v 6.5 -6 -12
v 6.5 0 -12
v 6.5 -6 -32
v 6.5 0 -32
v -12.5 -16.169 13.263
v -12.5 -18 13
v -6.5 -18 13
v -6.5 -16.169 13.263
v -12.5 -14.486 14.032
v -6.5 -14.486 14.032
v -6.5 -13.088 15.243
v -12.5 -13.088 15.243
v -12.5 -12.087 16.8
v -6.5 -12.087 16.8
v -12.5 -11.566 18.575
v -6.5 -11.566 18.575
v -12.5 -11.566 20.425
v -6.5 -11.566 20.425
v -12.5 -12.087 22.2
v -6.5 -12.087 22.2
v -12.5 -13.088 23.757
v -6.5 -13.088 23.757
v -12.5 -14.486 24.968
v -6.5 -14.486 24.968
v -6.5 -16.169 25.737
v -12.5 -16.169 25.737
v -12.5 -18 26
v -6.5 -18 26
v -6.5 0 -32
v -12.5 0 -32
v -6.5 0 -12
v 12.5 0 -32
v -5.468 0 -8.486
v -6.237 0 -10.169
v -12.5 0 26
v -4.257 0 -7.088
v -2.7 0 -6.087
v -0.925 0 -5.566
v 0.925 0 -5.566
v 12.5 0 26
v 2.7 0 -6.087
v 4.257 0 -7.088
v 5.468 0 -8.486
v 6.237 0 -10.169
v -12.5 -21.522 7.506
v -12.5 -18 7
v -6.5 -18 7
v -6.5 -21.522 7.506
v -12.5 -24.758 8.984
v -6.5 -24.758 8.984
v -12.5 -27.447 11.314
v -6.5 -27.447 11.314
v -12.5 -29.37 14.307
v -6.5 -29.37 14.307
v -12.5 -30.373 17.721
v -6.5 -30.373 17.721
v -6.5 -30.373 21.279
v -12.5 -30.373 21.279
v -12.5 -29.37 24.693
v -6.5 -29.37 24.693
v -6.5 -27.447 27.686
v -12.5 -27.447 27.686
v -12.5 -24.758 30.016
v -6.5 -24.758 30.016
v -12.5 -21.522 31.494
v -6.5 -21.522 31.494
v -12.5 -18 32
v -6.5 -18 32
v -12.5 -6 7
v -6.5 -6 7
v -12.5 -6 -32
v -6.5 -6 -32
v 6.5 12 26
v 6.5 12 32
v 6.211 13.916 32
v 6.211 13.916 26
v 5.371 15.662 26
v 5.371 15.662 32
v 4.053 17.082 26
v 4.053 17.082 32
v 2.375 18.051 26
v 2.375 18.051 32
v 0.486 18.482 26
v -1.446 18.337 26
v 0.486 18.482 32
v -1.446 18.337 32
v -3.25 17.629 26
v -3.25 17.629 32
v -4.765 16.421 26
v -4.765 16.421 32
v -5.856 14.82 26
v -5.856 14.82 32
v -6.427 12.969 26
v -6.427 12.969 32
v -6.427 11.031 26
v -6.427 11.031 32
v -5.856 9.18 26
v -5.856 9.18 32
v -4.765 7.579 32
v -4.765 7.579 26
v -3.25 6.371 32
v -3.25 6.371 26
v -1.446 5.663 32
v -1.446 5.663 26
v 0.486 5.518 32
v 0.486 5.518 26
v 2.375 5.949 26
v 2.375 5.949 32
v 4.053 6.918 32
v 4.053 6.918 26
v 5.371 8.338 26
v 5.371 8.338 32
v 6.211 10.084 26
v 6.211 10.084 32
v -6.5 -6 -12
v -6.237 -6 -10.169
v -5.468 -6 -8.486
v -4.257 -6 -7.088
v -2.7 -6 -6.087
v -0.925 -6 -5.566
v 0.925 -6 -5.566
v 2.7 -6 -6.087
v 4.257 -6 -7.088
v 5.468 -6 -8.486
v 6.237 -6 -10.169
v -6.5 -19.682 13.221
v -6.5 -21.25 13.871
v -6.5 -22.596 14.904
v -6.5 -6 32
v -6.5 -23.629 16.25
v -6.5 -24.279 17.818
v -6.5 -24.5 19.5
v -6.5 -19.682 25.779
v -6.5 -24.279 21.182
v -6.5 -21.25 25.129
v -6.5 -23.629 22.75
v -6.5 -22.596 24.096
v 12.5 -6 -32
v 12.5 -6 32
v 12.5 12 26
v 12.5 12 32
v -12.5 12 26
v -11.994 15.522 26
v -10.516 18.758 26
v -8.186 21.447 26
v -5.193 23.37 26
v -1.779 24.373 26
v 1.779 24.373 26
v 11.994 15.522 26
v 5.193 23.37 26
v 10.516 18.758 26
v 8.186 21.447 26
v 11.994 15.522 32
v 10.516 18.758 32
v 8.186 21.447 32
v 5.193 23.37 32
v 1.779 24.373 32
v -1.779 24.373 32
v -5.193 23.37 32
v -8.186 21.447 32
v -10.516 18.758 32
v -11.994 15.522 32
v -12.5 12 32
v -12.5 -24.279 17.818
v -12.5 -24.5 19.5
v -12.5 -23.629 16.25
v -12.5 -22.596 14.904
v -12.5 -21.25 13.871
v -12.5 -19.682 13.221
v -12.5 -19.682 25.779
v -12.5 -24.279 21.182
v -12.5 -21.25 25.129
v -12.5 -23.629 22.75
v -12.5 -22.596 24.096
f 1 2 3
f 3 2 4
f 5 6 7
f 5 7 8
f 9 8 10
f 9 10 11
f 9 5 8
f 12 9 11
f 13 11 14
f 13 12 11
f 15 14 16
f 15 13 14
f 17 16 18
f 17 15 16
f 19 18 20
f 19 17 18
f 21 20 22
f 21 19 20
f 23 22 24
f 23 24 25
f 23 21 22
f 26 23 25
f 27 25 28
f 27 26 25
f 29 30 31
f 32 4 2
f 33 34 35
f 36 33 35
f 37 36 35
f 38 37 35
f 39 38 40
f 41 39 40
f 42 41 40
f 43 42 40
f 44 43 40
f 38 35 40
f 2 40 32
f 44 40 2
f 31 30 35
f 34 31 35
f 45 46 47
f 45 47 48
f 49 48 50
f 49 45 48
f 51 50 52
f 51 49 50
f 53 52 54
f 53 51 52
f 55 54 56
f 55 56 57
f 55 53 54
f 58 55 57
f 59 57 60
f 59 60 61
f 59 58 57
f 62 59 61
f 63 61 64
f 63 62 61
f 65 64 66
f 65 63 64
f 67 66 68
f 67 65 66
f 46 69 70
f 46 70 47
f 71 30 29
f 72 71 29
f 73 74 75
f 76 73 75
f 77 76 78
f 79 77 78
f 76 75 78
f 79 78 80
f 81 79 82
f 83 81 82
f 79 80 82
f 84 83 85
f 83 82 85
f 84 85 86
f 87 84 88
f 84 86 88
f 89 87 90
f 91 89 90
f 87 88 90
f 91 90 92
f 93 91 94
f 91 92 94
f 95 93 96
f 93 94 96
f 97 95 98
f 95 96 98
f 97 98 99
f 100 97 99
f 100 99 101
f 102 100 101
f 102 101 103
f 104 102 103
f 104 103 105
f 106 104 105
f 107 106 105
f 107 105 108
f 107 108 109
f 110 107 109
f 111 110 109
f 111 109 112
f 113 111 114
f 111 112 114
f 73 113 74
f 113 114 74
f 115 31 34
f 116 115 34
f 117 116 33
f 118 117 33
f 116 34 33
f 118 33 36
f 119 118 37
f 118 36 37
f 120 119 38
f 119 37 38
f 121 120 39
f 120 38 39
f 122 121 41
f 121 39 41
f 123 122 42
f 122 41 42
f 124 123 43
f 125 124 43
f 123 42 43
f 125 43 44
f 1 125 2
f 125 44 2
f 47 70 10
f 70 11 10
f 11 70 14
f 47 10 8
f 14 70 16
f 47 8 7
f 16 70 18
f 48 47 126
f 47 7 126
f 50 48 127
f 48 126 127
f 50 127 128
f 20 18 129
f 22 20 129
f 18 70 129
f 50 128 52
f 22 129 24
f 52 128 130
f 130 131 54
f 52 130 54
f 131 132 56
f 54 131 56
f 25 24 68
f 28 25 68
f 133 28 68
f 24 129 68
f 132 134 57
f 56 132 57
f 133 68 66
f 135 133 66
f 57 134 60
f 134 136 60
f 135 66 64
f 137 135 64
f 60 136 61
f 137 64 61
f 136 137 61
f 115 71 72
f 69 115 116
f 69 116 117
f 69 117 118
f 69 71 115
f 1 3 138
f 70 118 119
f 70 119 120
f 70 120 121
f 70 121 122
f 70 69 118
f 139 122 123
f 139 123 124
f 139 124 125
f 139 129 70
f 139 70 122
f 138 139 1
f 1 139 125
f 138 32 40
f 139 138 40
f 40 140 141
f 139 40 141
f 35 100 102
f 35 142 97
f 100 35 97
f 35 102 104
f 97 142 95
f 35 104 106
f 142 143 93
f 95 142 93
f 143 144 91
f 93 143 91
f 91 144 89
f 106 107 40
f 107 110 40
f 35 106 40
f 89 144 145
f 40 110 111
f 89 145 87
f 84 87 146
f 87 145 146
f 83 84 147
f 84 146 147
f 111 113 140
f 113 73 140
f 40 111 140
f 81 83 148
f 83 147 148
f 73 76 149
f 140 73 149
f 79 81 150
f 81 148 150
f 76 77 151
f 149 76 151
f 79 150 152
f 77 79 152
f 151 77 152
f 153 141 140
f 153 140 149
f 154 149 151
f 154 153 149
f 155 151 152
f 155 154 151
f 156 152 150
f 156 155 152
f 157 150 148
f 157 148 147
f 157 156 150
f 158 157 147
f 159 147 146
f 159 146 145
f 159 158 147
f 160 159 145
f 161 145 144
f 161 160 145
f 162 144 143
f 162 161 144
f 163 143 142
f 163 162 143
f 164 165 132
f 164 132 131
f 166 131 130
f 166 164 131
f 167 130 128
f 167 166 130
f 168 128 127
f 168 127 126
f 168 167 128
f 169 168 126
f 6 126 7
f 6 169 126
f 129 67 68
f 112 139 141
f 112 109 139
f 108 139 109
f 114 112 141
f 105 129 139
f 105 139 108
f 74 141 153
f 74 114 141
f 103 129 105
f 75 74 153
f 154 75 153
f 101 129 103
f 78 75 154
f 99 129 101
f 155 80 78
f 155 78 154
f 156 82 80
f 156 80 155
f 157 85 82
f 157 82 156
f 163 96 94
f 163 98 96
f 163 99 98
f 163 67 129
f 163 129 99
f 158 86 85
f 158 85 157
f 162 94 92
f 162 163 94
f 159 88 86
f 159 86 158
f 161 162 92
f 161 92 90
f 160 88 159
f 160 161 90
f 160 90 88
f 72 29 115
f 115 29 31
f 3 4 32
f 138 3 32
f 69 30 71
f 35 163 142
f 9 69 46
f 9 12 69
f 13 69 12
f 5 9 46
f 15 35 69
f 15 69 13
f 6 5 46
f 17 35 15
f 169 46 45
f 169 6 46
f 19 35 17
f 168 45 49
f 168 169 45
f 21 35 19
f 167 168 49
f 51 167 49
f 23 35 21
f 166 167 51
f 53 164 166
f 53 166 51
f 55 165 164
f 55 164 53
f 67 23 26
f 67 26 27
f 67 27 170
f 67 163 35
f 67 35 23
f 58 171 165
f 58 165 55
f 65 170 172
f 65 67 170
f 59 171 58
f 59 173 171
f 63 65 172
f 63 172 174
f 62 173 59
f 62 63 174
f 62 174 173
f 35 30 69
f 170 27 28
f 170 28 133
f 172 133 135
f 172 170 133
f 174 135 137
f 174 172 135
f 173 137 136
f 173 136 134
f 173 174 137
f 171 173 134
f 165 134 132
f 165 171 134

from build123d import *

# Parameters (mm, degrees)
F1_DEPTH = 6
F2_R     = 6.5
F3_DEPTH = 6
F5_DEPTH = 6


with BuildPart() as f1:
    # F0 (on Front) → F1 (new body)
    with BuildSketch(Plane.XZ):
        with BuildLine():
            Line((12.5, -32), (12.5, 32))
            Line((12.5, 32), (-12.5, 32))
            Line((-12.5, 32), (-12.5, -32))
            Line((-12.5, -32), (-6.5, -32))
            Line((-6.5, -32), (-6.5, -12))
            ThreePointArc((-6.5, -12), (0, -5.5), (6.5, -12))
            Line((6.5, -12), (6.5, -32))
            Line((6.5, -32), (12.5, -32))
        make_face()
    extrude(amount=F1_DEPTH)

    # F2 (on face) → F3 (join)
    with BuildSketch(Plane.XY.offset(32)):
        with BuildLine():
            Line((-12.5, -6), (12.5, -6))
            Line((12.5, -6), (12.5, 12))
            ThreePointArc((12.5, 12), (0, -0.5), (-12.5, 12))
            Line((-12.5, 12), (-12.5, -6))
        make_face()
        with BuildLine():
            ThreePointArc((-12.5, 12), (0, -0.5), (12.5, 12))
            ThreePointArc((12.5, 12), (0, 24.5), (-12.5, 12))
        make_face()
        with Locations((0, 12)):
            Circle(F2_R, mode=Mode.SUBTRACT)
    extrude(amount=-F3_DEPTH)

    # F4 (on face) → F5 (join)
    with BuildSketch(Plane(origin=(-12.5, 0, 0), x_dir=(0, -1, 0), z_dir=(-1, 0, 0))):
        with BuildLine():
            ThreePointArc((18, 7), (30.5, 19.5), (18, 32))
            Line((18, 32), (18, 26))
            ThreePointArc((18, 26), (22.596194, 24.096194), (24.5, 19.5))
            ThreePointArc((24.5, 19.5), (22.596194, 14.903806), (18, 13))
            Line((18, 13), (18, 7))
        make_face()
        with BuildLine():
            Line((18, 32), (6, 32))
            Line((6, 32), (6, 7))
            Line((6, 7), (18, 7))
            Line((18, 7), (18, 13))
            ThreePointArc((18, 13), (11.5, 19.5), (18, 26))
            Line((18, 26), (18, 32))
        make_face()
    extrude(amount=-F5_DEPTH)


solid = f1.part
